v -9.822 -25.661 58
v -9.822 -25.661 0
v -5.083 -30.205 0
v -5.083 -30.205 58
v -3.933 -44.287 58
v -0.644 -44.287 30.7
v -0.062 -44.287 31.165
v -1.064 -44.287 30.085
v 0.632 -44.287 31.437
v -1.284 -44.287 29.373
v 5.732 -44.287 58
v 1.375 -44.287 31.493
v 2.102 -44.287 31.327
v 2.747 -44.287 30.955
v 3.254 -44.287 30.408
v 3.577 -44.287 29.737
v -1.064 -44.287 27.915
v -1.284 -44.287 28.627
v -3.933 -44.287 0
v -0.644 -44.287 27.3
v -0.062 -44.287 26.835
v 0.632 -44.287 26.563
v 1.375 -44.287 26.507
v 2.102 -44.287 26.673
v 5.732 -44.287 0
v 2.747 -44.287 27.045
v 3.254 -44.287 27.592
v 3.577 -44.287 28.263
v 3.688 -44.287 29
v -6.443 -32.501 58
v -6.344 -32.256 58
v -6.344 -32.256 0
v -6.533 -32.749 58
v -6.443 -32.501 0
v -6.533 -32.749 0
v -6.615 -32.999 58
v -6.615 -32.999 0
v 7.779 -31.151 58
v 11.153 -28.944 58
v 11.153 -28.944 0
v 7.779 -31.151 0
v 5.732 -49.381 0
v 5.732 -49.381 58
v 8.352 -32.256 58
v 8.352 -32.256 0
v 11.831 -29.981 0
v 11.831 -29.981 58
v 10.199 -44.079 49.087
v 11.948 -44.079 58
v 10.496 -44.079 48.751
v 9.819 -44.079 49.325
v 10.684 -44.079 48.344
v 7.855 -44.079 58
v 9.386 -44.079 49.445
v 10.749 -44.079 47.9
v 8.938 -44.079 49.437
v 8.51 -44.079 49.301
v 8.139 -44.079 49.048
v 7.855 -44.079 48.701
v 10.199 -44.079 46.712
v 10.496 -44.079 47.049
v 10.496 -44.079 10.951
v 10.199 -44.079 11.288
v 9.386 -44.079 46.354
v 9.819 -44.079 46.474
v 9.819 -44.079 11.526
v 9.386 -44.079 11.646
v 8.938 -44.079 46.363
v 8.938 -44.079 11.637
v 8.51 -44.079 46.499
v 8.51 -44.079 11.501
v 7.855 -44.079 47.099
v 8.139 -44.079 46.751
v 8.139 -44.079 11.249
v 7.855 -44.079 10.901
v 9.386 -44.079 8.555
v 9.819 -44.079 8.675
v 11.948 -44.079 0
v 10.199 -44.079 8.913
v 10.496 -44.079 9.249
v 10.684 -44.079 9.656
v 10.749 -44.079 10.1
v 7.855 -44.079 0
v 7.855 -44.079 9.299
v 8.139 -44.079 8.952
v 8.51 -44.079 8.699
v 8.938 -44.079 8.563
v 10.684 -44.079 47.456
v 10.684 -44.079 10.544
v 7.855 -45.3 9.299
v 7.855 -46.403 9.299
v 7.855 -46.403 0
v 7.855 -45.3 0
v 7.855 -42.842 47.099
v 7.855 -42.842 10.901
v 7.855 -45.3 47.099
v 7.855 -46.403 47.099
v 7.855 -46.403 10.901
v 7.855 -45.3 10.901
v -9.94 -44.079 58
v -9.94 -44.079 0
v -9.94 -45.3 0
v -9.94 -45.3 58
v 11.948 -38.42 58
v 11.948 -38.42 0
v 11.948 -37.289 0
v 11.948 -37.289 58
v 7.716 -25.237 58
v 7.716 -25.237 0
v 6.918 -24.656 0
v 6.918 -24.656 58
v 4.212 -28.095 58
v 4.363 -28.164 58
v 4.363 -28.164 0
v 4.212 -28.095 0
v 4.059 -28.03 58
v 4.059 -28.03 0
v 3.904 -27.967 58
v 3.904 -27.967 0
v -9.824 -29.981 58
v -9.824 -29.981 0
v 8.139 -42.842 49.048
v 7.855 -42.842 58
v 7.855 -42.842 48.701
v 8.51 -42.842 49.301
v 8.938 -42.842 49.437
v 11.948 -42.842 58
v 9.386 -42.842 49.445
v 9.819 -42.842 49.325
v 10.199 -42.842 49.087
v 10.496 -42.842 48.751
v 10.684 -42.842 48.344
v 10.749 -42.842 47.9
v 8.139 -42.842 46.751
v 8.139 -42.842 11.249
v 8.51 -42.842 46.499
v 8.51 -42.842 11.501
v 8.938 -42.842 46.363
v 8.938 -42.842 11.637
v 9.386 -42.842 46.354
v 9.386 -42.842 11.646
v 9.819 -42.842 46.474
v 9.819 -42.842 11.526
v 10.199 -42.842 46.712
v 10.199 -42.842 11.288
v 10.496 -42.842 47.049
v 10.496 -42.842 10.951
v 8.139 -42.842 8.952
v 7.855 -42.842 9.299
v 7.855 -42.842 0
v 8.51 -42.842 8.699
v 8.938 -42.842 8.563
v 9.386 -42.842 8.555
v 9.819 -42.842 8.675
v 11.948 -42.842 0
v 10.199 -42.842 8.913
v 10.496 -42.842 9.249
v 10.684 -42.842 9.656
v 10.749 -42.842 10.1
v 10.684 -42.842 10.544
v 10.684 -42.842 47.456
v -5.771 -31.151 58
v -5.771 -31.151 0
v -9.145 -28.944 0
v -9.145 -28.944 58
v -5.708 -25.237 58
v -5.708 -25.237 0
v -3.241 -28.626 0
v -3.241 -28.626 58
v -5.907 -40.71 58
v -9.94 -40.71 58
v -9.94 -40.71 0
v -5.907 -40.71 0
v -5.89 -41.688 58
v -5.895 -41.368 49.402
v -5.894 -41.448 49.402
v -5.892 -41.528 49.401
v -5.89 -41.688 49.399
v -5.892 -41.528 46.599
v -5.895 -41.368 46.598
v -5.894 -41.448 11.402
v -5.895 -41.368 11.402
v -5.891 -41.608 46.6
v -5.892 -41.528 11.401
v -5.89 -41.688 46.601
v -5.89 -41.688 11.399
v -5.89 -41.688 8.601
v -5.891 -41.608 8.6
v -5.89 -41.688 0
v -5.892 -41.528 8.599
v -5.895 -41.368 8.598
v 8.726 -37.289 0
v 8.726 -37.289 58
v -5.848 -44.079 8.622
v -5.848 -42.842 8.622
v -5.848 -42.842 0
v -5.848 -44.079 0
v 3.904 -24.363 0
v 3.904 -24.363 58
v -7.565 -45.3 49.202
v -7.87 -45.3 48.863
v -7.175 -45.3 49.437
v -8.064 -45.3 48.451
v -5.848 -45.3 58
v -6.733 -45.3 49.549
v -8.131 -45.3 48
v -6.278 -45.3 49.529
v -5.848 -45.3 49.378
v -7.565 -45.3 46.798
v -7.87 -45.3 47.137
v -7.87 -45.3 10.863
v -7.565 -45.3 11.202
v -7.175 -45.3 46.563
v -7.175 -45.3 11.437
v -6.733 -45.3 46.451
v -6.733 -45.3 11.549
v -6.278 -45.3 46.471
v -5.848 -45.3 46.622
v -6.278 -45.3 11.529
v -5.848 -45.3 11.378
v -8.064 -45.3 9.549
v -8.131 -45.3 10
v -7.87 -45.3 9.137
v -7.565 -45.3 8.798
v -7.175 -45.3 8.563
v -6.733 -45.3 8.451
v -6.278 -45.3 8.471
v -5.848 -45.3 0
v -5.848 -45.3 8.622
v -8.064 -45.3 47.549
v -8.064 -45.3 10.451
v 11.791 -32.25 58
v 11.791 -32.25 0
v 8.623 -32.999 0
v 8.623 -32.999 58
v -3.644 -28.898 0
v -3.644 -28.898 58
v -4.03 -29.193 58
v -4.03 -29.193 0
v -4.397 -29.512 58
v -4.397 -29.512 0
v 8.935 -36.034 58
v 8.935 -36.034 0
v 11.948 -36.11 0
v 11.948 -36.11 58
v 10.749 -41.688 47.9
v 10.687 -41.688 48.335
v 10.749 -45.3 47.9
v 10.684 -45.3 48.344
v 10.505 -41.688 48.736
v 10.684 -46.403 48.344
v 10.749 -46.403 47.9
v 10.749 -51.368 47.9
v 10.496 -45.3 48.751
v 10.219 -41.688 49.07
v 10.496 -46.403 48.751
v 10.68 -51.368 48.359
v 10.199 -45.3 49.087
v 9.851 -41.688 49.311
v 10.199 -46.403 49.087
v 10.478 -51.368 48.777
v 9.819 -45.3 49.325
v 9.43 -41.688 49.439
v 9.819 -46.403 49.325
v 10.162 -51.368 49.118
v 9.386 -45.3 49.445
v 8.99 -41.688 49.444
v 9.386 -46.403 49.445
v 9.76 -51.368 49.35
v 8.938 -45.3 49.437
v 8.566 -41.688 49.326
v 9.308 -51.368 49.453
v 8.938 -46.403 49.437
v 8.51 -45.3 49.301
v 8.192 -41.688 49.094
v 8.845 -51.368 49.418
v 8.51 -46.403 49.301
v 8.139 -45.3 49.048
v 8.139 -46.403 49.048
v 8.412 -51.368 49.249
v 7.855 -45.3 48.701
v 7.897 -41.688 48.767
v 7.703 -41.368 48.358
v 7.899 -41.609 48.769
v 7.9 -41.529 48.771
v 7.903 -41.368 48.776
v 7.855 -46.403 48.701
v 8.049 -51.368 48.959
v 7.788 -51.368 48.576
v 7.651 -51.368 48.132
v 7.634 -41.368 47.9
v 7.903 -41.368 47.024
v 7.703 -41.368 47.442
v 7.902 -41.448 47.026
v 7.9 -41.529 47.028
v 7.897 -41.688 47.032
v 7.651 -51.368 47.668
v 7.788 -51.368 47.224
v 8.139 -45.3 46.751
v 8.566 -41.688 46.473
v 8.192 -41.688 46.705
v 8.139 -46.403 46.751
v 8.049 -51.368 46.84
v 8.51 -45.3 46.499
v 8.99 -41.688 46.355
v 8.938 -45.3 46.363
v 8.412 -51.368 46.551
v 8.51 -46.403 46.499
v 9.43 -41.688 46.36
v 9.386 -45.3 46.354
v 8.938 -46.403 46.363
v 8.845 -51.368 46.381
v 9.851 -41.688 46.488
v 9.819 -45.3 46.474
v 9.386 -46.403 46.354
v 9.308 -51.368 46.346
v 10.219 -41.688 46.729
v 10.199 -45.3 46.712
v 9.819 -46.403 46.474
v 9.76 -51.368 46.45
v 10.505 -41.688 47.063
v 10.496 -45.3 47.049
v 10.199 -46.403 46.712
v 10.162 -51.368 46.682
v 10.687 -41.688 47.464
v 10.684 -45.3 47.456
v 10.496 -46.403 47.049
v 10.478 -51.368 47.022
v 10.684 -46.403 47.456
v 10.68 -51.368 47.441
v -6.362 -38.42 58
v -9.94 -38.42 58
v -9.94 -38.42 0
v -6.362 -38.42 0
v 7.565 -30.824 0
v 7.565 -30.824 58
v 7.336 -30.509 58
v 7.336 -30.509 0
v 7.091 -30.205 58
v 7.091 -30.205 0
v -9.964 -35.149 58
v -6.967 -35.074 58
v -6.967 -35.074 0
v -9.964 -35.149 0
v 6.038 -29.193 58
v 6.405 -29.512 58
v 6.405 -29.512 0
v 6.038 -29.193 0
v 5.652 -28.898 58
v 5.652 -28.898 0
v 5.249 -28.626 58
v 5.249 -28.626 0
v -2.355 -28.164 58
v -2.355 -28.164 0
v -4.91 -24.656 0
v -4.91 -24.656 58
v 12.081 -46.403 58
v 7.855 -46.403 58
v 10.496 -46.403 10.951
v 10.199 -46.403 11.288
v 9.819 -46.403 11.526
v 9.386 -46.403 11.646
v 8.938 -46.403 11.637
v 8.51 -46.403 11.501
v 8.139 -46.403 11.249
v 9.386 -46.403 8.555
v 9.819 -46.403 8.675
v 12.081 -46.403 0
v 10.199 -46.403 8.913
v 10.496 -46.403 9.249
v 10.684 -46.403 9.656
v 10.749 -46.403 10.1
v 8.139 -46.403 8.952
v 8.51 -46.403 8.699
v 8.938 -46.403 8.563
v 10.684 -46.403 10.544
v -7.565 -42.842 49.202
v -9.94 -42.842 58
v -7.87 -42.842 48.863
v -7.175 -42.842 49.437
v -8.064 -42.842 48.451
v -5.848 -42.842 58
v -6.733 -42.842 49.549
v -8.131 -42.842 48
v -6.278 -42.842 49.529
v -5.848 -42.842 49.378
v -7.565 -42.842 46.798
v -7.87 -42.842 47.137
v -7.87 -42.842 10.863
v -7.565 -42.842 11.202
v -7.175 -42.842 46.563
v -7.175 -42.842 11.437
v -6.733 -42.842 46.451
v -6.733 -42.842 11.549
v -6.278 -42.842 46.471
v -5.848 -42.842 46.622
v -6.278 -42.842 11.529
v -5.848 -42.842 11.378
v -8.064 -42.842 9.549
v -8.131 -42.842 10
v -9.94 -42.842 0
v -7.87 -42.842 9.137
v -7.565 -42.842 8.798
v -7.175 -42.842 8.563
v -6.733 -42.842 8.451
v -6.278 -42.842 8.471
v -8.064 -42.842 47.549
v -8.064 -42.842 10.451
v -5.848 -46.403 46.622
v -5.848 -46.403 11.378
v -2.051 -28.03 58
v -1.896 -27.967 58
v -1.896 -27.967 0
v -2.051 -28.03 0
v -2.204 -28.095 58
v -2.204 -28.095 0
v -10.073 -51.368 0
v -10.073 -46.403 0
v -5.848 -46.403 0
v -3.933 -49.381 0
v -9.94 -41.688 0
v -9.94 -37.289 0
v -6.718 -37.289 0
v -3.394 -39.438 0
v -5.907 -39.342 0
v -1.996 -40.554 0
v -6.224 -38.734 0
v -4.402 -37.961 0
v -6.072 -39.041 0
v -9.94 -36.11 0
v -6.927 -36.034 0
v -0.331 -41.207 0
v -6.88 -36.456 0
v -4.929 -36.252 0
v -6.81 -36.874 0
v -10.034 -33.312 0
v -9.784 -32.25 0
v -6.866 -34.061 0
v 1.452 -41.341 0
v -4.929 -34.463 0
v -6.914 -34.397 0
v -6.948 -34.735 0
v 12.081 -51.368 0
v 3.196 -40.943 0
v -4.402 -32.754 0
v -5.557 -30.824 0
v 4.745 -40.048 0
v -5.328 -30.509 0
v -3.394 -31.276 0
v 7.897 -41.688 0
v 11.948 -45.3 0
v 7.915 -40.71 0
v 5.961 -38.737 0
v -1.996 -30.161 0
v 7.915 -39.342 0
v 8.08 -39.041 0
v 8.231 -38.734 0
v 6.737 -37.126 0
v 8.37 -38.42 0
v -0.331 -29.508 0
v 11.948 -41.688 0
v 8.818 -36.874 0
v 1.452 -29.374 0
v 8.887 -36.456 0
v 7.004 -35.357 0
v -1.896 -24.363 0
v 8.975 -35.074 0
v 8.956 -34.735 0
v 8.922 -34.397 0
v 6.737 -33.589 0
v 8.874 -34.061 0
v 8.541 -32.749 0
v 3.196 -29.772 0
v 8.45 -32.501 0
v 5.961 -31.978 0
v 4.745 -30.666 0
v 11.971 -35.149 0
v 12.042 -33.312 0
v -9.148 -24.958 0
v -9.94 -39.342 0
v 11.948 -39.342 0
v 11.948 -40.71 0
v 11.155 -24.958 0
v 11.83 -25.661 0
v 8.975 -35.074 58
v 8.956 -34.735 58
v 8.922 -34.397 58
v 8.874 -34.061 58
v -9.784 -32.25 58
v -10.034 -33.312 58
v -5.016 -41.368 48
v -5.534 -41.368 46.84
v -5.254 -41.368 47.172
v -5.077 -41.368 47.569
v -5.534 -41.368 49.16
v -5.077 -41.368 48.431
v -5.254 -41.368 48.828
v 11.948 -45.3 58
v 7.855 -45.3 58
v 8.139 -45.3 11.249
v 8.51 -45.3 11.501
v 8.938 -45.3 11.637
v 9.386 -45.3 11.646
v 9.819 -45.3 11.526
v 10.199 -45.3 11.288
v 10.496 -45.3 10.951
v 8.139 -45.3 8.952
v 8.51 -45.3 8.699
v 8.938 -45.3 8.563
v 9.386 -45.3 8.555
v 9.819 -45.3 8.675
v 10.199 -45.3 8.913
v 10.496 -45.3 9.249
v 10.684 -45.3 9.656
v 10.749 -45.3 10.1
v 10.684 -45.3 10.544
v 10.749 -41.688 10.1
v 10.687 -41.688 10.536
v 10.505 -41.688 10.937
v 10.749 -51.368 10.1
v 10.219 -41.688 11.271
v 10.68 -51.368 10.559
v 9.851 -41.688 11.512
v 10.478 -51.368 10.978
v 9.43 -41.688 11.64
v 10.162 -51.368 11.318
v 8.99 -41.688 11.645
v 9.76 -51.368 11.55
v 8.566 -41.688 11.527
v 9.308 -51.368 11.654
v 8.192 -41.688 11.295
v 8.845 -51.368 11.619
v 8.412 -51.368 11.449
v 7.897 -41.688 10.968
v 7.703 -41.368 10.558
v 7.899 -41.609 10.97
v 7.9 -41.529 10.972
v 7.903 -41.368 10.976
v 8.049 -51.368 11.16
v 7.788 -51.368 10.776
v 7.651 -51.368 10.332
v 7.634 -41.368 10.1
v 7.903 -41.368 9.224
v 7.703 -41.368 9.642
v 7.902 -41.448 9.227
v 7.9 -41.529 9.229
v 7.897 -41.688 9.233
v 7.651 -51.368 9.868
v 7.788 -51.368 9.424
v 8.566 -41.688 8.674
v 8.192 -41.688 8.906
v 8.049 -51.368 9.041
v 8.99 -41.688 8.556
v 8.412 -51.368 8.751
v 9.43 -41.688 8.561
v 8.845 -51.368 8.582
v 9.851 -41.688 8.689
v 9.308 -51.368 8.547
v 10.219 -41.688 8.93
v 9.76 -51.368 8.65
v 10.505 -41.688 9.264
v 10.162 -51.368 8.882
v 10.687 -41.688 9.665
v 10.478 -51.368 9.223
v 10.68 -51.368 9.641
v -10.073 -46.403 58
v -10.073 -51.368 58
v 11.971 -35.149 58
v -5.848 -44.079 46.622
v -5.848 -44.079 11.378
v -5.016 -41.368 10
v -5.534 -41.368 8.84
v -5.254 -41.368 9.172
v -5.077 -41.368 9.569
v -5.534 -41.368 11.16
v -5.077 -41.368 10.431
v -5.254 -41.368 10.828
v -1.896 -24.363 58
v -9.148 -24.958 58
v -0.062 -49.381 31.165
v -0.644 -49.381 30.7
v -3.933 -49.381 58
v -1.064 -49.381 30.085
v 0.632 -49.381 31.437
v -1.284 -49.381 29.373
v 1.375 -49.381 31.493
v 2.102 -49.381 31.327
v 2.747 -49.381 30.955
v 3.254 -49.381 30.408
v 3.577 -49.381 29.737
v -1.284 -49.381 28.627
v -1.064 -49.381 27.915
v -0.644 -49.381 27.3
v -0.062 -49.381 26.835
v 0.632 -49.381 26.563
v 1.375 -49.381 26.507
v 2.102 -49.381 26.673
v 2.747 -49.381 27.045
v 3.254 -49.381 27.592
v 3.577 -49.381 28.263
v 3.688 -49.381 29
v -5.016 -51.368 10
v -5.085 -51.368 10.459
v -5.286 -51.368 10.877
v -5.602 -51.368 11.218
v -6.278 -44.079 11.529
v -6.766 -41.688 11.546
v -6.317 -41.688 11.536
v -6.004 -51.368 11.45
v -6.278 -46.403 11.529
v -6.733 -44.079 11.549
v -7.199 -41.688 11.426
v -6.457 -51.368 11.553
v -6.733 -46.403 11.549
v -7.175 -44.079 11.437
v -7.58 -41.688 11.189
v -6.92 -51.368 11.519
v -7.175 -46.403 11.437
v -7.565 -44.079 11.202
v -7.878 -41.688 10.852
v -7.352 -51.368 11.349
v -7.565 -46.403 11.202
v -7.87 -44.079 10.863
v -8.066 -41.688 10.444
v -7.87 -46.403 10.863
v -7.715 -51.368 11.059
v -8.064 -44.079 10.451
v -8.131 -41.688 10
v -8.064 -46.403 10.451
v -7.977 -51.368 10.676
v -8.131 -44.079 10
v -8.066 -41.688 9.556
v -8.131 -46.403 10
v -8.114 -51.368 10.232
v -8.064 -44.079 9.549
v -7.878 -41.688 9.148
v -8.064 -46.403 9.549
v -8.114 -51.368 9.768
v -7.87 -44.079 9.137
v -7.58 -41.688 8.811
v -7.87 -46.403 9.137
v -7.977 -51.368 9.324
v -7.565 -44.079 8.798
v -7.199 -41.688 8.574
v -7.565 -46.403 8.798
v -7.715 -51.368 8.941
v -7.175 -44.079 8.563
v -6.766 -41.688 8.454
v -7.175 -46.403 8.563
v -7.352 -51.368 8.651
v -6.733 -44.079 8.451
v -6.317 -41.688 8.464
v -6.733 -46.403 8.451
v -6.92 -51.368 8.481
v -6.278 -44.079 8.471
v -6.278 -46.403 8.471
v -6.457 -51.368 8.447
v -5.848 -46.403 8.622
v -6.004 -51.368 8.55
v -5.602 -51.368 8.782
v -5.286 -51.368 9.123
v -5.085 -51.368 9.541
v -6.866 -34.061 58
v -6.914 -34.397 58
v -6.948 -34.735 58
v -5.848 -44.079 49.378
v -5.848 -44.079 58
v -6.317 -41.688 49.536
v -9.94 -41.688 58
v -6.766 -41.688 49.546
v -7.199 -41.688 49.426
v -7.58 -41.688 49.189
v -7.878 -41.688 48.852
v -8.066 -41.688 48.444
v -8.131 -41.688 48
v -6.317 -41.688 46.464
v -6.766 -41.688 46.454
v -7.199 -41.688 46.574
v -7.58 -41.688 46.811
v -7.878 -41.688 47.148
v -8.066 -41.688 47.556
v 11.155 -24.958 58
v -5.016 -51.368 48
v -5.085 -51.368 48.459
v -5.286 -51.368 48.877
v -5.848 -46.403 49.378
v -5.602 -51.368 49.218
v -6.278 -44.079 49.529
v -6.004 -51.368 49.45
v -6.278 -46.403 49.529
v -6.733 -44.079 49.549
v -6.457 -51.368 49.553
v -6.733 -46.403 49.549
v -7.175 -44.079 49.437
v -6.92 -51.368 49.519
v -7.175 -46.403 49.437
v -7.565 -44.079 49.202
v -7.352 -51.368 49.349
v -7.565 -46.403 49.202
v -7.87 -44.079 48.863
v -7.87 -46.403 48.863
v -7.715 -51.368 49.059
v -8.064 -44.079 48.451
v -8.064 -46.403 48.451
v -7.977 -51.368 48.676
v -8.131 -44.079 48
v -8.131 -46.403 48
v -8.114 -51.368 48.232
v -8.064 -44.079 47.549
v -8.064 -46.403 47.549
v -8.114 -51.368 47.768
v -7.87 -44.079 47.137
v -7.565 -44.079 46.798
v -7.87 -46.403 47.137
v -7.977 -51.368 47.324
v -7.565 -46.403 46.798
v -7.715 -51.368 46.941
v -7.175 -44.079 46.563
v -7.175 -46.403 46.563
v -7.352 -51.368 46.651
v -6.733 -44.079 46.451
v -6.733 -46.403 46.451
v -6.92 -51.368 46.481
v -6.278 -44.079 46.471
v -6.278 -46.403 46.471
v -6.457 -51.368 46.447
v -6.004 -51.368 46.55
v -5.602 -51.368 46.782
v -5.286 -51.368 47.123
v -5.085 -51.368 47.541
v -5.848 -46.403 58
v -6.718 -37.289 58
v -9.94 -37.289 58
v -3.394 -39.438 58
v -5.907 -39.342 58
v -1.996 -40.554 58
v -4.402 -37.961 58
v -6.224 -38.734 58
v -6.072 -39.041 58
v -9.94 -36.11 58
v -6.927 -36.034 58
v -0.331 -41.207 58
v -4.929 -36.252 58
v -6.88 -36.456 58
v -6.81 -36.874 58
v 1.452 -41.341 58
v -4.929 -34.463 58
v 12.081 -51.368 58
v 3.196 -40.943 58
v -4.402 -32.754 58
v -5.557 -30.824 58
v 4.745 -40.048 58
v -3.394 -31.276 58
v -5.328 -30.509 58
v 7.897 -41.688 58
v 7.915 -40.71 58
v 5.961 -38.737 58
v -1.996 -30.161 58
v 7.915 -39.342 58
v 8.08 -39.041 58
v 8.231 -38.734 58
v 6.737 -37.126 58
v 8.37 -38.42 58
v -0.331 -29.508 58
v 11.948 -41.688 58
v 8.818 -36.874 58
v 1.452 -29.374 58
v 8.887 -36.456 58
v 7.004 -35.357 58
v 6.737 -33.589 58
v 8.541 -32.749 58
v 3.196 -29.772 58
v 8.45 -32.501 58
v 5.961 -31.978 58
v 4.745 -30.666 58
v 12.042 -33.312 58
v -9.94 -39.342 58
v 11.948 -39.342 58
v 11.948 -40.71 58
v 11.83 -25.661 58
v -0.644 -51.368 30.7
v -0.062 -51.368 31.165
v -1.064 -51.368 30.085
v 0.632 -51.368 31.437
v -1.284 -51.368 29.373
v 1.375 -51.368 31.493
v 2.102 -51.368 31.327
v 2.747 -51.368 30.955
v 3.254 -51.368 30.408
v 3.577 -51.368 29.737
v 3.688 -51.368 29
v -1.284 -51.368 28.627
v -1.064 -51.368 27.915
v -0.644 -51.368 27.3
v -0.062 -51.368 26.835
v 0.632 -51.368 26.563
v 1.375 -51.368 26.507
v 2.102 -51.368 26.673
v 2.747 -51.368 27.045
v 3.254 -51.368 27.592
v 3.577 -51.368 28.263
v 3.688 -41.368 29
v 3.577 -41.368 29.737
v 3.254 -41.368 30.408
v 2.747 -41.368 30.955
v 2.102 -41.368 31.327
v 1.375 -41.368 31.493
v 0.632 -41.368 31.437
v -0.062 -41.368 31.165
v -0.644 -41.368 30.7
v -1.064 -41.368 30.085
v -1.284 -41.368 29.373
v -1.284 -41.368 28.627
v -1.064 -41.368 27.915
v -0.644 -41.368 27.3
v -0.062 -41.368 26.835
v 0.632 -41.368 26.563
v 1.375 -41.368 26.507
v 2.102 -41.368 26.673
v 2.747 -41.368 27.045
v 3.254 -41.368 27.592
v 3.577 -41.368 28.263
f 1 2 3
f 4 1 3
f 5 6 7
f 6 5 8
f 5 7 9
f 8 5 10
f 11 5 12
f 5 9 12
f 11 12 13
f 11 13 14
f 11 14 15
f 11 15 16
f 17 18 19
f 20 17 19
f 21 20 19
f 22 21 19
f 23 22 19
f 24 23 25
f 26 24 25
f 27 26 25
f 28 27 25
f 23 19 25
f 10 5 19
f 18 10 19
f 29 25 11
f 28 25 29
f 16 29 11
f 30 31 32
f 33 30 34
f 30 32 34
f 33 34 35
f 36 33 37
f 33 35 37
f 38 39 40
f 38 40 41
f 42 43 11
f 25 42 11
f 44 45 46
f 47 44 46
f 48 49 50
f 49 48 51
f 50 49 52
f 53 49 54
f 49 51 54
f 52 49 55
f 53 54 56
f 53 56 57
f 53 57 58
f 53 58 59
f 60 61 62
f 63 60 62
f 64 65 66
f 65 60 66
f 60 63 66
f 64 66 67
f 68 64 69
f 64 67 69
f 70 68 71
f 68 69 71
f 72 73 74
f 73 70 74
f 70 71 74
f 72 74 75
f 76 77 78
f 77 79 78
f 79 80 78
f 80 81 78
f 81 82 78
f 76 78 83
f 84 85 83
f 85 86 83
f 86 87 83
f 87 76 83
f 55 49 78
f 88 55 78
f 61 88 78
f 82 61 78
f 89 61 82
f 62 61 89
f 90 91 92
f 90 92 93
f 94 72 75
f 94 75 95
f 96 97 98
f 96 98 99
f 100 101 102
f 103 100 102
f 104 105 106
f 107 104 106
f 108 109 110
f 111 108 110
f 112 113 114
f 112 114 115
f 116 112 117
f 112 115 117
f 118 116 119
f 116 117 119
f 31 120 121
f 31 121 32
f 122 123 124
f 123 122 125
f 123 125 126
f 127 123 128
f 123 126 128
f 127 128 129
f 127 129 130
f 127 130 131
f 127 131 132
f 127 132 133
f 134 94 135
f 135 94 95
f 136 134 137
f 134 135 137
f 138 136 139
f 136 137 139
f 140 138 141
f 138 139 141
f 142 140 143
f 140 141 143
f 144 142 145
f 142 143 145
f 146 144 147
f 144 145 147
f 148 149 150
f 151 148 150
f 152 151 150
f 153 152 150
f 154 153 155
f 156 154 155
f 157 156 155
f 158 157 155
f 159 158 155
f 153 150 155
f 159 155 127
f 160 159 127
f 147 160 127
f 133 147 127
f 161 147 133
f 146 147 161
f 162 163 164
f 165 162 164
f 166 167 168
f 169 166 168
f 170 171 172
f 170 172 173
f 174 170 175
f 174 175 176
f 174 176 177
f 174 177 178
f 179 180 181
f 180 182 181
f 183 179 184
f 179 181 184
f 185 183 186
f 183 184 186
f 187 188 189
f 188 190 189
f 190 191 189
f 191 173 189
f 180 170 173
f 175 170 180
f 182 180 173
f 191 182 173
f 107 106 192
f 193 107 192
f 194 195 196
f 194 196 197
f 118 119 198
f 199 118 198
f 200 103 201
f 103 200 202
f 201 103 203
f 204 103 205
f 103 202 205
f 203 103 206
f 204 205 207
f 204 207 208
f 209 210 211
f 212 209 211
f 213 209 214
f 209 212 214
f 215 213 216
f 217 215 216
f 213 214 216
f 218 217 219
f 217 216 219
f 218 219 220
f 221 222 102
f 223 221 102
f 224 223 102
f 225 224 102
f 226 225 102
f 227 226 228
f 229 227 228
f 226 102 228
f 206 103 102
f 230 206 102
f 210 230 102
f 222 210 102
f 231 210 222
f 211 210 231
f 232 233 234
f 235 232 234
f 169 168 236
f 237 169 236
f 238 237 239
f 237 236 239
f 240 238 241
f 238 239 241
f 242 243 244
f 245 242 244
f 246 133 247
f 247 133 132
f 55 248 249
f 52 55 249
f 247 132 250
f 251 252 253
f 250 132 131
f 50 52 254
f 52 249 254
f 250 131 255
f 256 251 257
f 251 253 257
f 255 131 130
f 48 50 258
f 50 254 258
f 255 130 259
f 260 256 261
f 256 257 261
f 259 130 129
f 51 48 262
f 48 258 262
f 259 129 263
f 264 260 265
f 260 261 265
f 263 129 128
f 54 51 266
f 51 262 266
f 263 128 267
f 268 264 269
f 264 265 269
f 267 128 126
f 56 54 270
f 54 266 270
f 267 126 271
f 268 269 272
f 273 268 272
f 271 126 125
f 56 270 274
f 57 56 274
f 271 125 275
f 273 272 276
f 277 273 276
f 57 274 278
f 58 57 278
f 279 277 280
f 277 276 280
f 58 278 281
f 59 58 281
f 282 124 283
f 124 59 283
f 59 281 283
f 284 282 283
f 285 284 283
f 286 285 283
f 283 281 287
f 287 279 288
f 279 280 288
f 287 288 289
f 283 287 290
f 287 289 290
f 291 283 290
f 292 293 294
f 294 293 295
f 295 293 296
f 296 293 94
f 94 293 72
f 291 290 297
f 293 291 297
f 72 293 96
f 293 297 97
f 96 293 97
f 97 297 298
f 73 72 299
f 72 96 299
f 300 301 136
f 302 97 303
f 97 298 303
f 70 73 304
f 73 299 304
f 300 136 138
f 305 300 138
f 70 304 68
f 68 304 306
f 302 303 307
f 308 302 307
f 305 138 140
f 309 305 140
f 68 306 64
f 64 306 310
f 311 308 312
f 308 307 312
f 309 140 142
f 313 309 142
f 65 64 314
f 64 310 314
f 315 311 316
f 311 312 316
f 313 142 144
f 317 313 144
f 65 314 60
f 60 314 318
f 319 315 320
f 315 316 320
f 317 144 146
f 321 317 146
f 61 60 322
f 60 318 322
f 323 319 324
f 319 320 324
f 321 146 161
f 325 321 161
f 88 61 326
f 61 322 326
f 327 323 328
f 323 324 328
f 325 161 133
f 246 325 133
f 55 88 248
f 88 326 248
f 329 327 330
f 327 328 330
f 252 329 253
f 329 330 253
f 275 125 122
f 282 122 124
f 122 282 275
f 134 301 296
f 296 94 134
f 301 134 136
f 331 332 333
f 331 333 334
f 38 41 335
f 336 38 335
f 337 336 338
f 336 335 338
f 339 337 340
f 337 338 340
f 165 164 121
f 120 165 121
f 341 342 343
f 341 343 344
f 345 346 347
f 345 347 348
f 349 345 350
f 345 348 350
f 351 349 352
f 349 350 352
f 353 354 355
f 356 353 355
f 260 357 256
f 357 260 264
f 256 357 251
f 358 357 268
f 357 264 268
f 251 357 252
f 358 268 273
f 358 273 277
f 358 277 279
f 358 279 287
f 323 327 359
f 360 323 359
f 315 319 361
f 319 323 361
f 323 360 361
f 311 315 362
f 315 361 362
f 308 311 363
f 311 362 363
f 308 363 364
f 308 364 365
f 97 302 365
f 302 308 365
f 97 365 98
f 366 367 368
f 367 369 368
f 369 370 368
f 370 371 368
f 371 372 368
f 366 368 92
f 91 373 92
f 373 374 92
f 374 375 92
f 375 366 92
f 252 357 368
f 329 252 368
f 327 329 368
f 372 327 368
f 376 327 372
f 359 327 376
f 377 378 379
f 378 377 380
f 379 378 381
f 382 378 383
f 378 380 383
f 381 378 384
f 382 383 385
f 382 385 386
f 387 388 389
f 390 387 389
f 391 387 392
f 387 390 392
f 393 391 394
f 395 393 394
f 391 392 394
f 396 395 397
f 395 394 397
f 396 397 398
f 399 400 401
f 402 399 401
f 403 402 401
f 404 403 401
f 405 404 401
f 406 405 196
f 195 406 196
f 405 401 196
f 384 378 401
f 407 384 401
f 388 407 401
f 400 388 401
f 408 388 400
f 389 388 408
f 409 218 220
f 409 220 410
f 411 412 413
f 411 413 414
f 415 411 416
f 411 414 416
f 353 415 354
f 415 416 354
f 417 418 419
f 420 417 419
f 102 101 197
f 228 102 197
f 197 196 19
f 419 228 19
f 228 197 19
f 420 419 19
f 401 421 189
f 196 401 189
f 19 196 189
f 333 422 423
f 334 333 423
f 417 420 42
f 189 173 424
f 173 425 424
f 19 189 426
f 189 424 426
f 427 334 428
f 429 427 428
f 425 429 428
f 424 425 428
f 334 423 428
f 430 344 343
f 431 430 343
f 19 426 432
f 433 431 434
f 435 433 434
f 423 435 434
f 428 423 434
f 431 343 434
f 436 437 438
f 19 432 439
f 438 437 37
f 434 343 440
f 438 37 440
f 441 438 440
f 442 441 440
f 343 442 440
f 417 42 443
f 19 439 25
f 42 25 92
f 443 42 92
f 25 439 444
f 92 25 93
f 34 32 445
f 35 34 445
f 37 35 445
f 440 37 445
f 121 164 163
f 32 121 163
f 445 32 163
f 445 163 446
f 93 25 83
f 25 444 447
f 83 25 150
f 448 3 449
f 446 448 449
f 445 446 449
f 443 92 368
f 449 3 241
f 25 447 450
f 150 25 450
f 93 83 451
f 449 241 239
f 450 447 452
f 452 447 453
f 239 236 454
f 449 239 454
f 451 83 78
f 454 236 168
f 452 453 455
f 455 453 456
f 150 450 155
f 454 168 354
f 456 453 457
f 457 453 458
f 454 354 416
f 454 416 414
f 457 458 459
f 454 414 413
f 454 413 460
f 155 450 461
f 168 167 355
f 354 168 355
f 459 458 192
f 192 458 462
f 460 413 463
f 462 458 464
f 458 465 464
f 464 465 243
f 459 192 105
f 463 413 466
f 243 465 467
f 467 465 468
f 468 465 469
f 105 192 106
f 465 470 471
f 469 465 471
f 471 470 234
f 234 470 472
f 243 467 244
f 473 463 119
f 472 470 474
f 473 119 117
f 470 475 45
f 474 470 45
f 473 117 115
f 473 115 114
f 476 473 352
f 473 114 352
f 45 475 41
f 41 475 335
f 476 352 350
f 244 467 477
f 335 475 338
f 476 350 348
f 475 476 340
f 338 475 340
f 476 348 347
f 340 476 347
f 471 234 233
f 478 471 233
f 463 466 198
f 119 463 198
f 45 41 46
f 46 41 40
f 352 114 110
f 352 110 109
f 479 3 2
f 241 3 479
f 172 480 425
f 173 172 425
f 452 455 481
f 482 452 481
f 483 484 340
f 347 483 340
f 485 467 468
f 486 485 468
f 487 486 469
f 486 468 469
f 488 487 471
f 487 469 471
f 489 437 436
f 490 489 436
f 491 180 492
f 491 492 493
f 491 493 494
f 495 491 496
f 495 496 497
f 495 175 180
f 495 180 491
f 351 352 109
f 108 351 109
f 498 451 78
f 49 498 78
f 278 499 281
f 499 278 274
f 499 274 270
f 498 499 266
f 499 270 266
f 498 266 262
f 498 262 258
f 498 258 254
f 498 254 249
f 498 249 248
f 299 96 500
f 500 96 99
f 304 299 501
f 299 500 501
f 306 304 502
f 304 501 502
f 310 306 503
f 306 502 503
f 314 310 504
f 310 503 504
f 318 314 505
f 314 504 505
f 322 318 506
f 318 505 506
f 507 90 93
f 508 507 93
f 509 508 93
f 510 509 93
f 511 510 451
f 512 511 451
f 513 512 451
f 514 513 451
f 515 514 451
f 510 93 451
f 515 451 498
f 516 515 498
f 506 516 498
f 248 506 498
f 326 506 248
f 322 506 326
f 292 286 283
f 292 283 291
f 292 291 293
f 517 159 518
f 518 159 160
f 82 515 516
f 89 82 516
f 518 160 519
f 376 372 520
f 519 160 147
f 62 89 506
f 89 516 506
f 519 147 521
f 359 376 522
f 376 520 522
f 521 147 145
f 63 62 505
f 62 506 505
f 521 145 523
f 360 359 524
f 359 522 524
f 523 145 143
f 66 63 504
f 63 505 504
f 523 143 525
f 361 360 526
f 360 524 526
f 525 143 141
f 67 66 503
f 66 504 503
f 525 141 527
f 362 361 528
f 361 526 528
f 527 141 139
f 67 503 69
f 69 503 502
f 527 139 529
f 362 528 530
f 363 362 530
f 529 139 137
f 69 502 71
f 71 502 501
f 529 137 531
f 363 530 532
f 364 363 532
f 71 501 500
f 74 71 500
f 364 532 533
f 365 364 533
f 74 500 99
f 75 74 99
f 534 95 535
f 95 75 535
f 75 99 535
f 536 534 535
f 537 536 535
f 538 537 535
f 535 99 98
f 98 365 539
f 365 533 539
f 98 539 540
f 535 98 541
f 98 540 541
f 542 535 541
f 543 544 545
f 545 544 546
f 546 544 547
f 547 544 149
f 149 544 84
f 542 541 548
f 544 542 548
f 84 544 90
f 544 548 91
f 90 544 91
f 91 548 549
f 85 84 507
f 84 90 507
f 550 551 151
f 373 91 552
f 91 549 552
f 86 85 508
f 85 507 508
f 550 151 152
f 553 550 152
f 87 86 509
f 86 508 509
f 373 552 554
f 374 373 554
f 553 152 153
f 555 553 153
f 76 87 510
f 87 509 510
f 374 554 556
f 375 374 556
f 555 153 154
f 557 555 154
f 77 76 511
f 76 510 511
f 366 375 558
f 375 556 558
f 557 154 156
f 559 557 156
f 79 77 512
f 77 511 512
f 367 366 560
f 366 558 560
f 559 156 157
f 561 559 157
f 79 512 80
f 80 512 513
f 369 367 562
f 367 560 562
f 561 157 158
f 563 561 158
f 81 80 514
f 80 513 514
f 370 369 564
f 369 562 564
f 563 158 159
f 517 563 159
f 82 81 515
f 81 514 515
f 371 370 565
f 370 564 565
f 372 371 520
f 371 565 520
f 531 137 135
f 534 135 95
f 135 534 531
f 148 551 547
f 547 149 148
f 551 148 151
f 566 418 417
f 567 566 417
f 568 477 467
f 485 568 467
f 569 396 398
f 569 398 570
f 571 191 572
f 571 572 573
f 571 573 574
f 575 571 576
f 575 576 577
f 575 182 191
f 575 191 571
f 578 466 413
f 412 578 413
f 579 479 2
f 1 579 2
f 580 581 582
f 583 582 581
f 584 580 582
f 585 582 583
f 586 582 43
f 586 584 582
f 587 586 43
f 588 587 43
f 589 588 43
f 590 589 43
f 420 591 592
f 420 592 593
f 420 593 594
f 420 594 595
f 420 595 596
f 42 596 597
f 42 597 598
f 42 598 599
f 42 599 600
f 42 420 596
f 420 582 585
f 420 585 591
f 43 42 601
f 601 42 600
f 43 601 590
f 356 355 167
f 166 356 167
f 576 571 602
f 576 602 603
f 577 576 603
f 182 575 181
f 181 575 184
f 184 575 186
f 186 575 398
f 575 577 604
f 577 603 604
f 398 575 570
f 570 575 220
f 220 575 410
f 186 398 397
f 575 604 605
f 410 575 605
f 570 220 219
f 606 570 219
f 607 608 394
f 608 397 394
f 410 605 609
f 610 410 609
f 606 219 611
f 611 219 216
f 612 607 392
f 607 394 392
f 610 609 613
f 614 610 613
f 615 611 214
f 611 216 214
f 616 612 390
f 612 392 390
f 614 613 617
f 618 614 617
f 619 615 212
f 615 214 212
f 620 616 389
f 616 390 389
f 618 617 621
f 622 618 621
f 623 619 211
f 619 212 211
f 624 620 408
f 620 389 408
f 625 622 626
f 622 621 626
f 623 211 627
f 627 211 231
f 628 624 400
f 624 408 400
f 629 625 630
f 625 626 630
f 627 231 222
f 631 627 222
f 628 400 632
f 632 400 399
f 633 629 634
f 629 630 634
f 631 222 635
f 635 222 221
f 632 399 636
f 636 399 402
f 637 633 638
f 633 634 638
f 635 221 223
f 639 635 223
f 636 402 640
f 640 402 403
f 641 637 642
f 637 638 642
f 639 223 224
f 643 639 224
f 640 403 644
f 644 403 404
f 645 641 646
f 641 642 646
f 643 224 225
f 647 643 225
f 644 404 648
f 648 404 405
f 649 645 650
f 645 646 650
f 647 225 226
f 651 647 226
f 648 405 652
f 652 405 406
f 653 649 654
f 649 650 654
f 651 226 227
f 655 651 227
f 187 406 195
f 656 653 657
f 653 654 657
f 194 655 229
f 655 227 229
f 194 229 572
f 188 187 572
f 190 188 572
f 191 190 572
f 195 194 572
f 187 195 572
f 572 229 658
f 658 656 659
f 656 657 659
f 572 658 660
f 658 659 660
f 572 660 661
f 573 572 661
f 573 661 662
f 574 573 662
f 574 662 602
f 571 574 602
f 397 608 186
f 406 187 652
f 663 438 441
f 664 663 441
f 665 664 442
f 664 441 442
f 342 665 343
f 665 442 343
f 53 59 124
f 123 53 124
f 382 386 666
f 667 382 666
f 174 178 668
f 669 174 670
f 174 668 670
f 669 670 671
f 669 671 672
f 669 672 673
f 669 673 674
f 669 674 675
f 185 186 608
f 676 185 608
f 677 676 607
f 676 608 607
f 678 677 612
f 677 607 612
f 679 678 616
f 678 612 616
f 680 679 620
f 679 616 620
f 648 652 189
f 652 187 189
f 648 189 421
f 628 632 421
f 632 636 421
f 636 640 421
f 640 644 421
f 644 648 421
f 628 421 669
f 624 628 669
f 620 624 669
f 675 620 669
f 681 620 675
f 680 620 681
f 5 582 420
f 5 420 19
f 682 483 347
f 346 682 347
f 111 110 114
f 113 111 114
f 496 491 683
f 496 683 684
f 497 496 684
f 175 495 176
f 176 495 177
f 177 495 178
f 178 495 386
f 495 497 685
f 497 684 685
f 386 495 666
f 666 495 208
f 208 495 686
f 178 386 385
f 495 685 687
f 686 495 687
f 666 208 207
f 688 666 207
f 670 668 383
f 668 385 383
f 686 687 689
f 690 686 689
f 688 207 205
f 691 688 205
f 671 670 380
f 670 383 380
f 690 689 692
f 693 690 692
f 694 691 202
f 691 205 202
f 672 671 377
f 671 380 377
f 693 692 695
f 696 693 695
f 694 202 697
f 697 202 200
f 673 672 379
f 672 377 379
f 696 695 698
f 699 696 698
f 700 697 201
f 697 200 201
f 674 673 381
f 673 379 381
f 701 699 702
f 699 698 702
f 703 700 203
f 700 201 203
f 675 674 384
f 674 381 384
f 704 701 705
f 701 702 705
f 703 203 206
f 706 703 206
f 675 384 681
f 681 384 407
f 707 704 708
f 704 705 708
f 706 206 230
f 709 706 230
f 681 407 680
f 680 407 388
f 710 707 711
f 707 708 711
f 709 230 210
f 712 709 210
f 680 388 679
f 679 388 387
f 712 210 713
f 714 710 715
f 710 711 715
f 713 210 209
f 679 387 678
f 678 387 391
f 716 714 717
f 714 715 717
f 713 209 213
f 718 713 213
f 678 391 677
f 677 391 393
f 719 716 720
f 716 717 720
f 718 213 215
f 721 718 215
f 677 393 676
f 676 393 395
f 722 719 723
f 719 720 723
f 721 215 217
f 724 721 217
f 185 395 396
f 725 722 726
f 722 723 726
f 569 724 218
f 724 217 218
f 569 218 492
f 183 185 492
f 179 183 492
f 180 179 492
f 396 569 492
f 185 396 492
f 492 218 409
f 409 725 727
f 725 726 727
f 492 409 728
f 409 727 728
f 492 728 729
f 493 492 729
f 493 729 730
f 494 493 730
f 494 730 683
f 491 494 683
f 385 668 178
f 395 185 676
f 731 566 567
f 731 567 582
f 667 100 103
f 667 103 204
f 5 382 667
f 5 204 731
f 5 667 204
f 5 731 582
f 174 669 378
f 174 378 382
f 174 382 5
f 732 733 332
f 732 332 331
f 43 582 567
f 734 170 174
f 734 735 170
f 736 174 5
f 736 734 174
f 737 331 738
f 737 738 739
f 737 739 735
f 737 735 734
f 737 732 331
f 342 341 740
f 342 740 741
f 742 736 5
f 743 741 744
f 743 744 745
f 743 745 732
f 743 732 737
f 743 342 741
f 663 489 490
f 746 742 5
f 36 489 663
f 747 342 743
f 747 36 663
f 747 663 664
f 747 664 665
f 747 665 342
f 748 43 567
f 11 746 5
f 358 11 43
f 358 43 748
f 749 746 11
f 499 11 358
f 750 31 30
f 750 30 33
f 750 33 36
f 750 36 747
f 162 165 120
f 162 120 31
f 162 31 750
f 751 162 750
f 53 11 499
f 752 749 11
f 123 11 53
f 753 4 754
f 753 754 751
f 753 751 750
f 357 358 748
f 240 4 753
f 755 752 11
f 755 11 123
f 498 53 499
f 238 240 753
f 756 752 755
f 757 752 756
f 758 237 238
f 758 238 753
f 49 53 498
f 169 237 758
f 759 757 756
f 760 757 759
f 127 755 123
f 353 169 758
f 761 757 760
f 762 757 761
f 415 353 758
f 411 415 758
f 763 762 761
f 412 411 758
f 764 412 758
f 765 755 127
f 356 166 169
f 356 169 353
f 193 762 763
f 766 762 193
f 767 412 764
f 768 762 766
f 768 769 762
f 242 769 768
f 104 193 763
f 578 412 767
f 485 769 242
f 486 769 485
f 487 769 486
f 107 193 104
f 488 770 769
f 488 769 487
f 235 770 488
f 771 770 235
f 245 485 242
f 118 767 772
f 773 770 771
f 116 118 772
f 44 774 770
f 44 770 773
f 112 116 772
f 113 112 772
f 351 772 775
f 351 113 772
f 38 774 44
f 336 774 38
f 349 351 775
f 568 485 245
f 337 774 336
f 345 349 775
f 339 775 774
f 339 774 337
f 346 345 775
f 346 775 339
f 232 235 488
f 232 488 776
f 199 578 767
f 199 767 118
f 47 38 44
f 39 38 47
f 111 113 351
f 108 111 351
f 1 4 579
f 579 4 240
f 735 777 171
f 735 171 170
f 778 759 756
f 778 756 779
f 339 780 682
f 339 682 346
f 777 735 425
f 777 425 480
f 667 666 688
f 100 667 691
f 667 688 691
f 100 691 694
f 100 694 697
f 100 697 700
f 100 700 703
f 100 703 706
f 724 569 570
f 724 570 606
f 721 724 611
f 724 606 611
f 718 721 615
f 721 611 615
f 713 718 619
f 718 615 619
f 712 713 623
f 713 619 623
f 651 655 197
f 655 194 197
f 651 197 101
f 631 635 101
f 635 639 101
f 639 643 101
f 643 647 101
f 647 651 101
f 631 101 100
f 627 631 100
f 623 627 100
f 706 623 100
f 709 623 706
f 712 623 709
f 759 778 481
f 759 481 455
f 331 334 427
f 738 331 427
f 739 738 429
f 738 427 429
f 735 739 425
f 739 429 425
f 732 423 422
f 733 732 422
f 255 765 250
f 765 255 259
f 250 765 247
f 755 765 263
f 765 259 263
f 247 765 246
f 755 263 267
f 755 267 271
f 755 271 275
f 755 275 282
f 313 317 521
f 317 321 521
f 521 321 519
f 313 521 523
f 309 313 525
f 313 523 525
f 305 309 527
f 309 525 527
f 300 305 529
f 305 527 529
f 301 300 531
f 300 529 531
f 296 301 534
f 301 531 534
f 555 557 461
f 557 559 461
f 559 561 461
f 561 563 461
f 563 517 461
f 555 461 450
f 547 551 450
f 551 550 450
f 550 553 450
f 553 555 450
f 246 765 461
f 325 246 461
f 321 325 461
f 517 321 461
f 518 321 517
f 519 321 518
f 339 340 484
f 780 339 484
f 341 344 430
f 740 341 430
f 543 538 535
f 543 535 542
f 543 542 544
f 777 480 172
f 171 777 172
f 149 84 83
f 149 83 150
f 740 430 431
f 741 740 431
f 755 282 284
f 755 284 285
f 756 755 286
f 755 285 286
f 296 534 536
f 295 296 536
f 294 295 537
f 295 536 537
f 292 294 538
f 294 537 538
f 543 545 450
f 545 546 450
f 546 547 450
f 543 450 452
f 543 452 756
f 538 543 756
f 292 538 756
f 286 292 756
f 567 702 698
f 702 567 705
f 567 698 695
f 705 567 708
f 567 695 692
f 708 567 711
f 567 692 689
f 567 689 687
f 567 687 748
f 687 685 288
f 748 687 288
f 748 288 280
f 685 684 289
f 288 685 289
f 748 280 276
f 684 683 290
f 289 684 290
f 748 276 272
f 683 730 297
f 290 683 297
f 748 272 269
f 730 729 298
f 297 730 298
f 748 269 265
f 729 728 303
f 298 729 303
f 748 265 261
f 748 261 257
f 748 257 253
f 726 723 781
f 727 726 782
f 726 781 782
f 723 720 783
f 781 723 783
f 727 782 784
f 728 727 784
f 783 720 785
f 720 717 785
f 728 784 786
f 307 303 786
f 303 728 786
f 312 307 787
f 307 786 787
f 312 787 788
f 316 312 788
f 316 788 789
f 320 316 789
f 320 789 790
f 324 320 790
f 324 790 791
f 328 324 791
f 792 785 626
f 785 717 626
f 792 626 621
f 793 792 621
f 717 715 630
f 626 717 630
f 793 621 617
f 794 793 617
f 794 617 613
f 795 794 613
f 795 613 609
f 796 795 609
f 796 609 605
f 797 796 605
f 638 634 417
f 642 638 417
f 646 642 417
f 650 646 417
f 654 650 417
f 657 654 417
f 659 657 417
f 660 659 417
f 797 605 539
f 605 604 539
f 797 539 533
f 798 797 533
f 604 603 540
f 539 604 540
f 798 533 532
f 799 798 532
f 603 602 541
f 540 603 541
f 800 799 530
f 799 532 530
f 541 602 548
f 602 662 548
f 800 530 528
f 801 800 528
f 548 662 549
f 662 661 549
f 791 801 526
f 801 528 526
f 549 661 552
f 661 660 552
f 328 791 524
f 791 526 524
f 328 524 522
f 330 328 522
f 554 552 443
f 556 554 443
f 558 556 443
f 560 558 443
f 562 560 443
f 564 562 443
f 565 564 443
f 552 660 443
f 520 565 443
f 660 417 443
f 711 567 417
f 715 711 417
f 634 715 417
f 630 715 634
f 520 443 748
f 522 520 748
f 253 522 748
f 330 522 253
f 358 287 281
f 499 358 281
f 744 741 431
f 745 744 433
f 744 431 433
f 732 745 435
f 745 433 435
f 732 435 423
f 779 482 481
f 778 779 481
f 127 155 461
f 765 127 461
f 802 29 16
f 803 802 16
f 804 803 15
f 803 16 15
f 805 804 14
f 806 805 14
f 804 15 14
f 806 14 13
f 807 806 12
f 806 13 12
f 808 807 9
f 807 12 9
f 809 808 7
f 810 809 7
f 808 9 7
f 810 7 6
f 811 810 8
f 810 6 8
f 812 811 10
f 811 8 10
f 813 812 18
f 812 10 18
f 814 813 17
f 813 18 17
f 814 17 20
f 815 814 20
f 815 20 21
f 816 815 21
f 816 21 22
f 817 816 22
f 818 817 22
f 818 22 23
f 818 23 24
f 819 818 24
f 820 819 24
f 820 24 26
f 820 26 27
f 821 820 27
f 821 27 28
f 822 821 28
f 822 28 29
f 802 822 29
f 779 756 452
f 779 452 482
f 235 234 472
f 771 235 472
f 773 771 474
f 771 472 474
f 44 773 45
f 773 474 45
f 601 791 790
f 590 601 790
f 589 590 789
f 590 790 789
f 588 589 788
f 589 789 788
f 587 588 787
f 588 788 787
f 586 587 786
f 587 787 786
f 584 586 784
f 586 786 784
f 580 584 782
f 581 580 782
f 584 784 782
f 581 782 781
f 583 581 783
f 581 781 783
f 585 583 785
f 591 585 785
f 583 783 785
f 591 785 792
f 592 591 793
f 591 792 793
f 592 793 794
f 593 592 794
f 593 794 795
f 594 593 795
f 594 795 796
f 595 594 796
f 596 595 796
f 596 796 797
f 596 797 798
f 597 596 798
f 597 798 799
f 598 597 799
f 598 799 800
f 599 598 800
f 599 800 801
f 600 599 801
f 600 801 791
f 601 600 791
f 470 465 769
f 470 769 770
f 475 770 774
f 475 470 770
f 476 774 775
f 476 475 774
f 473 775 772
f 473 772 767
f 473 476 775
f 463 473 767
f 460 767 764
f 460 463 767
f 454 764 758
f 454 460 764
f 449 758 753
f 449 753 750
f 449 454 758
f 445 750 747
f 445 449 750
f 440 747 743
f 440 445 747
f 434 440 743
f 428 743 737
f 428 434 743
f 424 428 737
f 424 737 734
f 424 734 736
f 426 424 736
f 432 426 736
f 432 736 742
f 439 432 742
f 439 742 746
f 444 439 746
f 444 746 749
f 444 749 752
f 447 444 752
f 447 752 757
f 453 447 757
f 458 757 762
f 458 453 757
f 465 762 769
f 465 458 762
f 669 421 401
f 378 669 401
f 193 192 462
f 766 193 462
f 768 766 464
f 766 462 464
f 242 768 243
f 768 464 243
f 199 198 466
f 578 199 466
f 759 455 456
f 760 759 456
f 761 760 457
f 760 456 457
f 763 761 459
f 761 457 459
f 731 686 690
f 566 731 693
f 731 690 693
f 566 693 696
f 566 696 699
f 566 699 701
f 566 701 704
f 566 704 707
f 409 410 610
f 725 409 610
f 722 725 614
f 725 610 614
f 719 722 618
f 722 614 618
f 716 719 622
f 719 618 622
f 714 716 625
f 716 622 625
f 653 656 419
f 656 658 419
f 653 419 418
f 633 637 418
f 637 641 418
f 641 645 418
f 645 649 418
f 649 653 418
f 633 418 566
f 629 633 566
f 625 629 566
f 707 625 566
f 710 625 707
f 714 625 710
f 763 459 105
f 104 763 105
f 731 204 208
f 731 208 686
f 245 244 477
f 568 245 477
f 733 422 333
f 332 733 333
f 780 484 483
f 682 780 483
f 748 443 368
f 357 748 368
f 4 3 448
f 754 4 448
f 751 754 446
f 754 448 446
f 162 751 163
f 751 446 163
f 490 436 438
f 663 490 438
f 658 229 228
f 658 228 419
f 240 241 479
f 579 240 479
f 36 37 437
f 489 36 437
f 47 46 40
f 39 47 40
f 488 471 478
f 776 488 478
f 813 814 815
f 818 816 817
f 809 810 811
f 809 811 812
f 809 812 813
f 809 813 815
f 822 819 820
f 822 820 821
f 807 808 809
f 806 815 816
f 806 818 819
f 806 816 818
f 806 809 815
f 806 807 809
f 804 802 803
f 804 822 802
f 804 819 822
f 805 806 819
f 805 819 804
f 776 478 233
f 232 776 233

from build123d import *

# Parameters (mm, degrees)
SKETCH1_R           = 6
SKETCH1_W           = 9.664317132
SKETCH1_H           = 5.093827802
BOSS_EXTRUDE1_DEPTH = 58
SKETCH2_R           = 2.5
SKETCH2_R_2         = 1.557642262
CUT_EXTRUDE1_DEPTH  = 10


with BuildPart() as part:
    # Sketch1 → Boss-Extrude1 (new body)
    with BuildSketch(Plane.XY):
        with BuildLine():
            Line((-9.822104082, -25.661413332), (-5.082925118, -30.205025059))
            ThreePointArc((-5.082925118, -30.205025059), (-5.444381805, -30.665269108), (-5.771113852, -31.15078089))
            Line((-5.771113852, -31.15078089), (-9.145384533, -28.943772104))
            Line((-9.145384533, -28.943772104), (-9.823578986, -29.980655904))
            Line((-9.823578986, -29.980655904), (-6.344193142, -32.256417352))
            ThreePointArc((-6.344193142, -32.256417352), (-6.488837019, -32.624364602), (-6.615069482, -32.999027645))
            Line((-6.615069482, -32.999027645), (-9.783580045, -32.250497314))
            Line((-9.783580045, -32.250497314), (-10.034391467, -33.312175922))
            Line((-10.034391467, -33.312175922), (-6.865985046, -34.060689065))
            ThreePointArc((-6.865985046, -34.060689065), (-6.932730681, -34.565893765), (-6.967078624, -35.074329589))
            Line((-6.967078624, -35.074329589), (-9.963607891, -35.148687431))
            Line((-9.963607891, -35.148687431), (-9.93976563, -36.109501168))
            Line((-9.93976563, -36.109501168), (-6.926935836, -36.033753282))
            ThreePointArc((-6.926935836, -36.033753282), (-6.847527662, -36.665356301), (-6.717901152, -37.288593816))
            Line((-6.717901152, -37.288593816), (-9.93976563, -37.288593816))
            Line((-9.93976563, -37.288593816), (-9.93976563, -38.42012165))
            Line((-9.93976563, -38.42012165), (-6.362008263, -38.42012165))
            ThreePointArc((-6.362008263, -38.42012165), (-6.149413668, -38.888266643), (-5.907103174, -39.341744119))
            Line((-5.907103174, -39.341744119), (-9.93976563, -39.341744119))
            Line((-9.93976563, -39.341744119), (-9.93976563, -40.709698074))
            Line((-9.93976563, -40.709698074), (-5.907103174, -40.709698074))
            Line((-5.907103174, -40.709698074), (-5.889625491, -41.688448301))
            Line((-5.889625491, -41.688448301), (-9.93976563, -41.688448301))
            Line((-9.93976563, -41.688448301), (-9.93976563, -42.842115912))
            Line((-9.93976563, -42.842115912), (-5.847543839, -42.842115912))
            Line((-5.847543839, -42.842115912), (-5.847543839, -44.079099033))
            Line((-5.847543839, -44.079099033), (-9.93976563, -44.079099033))
            Line((-9.93976563, -44.079099033), (-9.93976563, -45.299533915))
            Line((-9.93976563, -45.299533915), (-5.847543839, -45.299533915))
            Line((-5.847543839, -45.299533915), (-5.847543839, -46.402625605))
            Line((-5.847543839, -46.402625605), (-10.073482588, -46.402625605))
            Line((-10.073482588, -46.402625605), (-10.073482588, -51.367819628))
            Line((-10.073482588, -51.367819628), (-5.904369685, -51.367819628))
            Line((-5.904369685, -51.367819628), (1.003920553, -51.367819628))
            Line((1.003920553, -51.367819628), (7.912210791, -51.367819628))
            Line((7.912210791, -51.367819628), (12.081323694, -51.367819628))
            Line((12.081323694, -51.367819628), (12.081323694, -46.402625605))
            Line((12.081323694, -46.402625605), (7.855384945, -46.402625605))
            Line((7.855384945, -46.402625605), (7.855384945, -45.299533915))
            Line((7.855384945, -45.299533915), (11.947606735, -45.299533915))
            Line((11.947606735, -45.299533915), (11.947606735, -44.079099033))
            Line((11.947606735, -44.079099033), (7.855384945, -44.079099033))
            Line((7.855384945, -44.079099033), (7.855384945, -42.842115912))
            Line((7.855384945, -42.842115912), (11.947606735, -42.842115912))
            Line((11.947606735, -42.842115912), (11.947606735, -41.688448301))
            Line((11.947606735, -41.688448301), (7.897466597, -41.688448301))
            Line((7.897466597, -41.688448301), (7.914944279, -40.709698074))
            Line((7.914944279, -40.709698074), (11.947606735, -40.709698074))
            Line((11.947606735, -40.709698074), (11.947606735, -39.341744119))
            Line((11.947606735, -39.341744119), (7.914944279, -39.341744119))
            ThreePointArc((7.914944279, -39.341744119), (8.157254773, -38.888266643), (8.369849369, -38.42012165))
            Line((8.369849369, -38.42012165), (11.947606735, -38.42012165))
            Line((11.947606735, -38.42012165), (11.947606735, -37.288593816))
            Line((11.947606735, -37.288593816), (8.725742258, -37.288593816))
            ThreePointArc((8.725742258, -37.288593816), (8.855368768, -36.665356301), (8.934776942, -36.033753282))
            Line((8.934776942, -36.033753282), (11.947606735, -36.109501168))
            Line((11.947606735, -36.109501168), (11.971448997, -35.148687431))
            Line((11.971448997, -35.148687431), (8.974919729, -35.074329589))
            ThreePointArc((8.974919729, -35.074329589), (8.940571786, -34.565893765), (8.873826152, -34.060689065))
            Line((8.873826152, -34.060689065), (12.042232573, -33.312175922))
            Line((12.042232573, -33.312175922), (11.791421151, -32.250497314))
            Line((11.791421151, -32.250497314), (8.622910588, -32.999027645))
            ThreePointArc((8.622910588, -32.999027645), (8.496678124, -32.624364602), (8.352034248, -32.256417352))
            Line((8.352034248, -32.256417352), (11.831420091, -29.980655904))
            Line((11.831420091, -29.980655904), (11.153225638, -28.943772104))
            Line((11.153225638, -28.943772104), (7.778954958, -31.15078089))
            ThreePointArc((7.778954958, -31.15078089), (7.452222911, -30.665269108), (7.090766224, -30.205025059))
            Line((7.090766224, -30.205025059), (11.829945188, -25.661413332))
            Line((11.829945188, -25.661413332), (11.155479277, -24.957916896))
            Line((11.155479277, -24.957916896), (6.404976787, -29.512384871))
            ThreePointArc((6.404976787, -29.512384871), (5.847311339, -29.042565295), (5.248984501, -28.625760566))
            Line((5.248984501, -28.625760566), (7.716155949, -25.236928133))
            Line((7.716155949, -25.236928133), (6.917652539, -24.655593749))
            Line((6.917652539, -24.655593749), (4.363311136, -28.164160209))
            ThreePointArc((4.363311136, -28.164160209), (4.135366319, -28.062042381), (3.904321948, -27.967145652))
            Line((3.904321948, -27.967145652), (3.904321948, -24.362789588))
            Line((3.904321948, -24.362789588), (-1.896480842, -24.362789588))
            Line((-1.896480842, -24.362789588), (-1.896480842, -27.967145652))
            ThreePointArc((-1.896480842, -27.967145652), (-2.127525214, -28.062042381), (-2.35547003, -28.164160209))
            Line((-2.35547003, -28.164160209), (-4.909811434, -24.655593749))
            Line((-4.909811434, -24.655593749), (-5.708314844, -25.236928133))
            Line((-5.708314844, -25.236928133), (-3.241143396, -28.625760566))
            ThreePointArc((-3.241143396, -28.625760566), (-3.839470233, -29.042565295), (-4.397135681, -29.512384871))
            Line((-4.397135681, -29.512384871), (-9.147638171, -24.957916896))
            Line((-9.147638171, -24.957916896), (-9.822104082, -25.661413332))
        make_face()
        with Locations((1.003920553, -35.357441113)):
            Circle(SKETCH1_R, mode=Mode.SUBTRACT)
        with Locations((0.899494134, -46.834148598)):
            Rectangle(SKETCH1_W, SKETCH1_H, mode=Mode.SUBTRACT)
    extrude(amount=BOSS_EXTRUDE1_DEPTH)

    # Sketch2 → Cut-Extrude1 (cut)
    with BuildSketch(Plane.XZ.offset(51.367819628)):
        with Locations((1.188364706, 29)):
            Circle(SKETCH2_R)
        with Locations((-6.573482588, 10)):
            Circle(SKETCH2_R_2)
        with Locations((9.191259736, 10.100266019)):
            Circle(SKETCH2_R_2)
        with Locations((9.191259736, 47.899733981)):
            Circle(SKETCH2_R_2)
        with Locations((-6.573482588, 48)):
            Circle(SKETCH2_R_2)
    extrude(amount=-CUT_EXTRUDE1_DEPTH, mode=Mode.SUBTRACT)


solid = part.part
